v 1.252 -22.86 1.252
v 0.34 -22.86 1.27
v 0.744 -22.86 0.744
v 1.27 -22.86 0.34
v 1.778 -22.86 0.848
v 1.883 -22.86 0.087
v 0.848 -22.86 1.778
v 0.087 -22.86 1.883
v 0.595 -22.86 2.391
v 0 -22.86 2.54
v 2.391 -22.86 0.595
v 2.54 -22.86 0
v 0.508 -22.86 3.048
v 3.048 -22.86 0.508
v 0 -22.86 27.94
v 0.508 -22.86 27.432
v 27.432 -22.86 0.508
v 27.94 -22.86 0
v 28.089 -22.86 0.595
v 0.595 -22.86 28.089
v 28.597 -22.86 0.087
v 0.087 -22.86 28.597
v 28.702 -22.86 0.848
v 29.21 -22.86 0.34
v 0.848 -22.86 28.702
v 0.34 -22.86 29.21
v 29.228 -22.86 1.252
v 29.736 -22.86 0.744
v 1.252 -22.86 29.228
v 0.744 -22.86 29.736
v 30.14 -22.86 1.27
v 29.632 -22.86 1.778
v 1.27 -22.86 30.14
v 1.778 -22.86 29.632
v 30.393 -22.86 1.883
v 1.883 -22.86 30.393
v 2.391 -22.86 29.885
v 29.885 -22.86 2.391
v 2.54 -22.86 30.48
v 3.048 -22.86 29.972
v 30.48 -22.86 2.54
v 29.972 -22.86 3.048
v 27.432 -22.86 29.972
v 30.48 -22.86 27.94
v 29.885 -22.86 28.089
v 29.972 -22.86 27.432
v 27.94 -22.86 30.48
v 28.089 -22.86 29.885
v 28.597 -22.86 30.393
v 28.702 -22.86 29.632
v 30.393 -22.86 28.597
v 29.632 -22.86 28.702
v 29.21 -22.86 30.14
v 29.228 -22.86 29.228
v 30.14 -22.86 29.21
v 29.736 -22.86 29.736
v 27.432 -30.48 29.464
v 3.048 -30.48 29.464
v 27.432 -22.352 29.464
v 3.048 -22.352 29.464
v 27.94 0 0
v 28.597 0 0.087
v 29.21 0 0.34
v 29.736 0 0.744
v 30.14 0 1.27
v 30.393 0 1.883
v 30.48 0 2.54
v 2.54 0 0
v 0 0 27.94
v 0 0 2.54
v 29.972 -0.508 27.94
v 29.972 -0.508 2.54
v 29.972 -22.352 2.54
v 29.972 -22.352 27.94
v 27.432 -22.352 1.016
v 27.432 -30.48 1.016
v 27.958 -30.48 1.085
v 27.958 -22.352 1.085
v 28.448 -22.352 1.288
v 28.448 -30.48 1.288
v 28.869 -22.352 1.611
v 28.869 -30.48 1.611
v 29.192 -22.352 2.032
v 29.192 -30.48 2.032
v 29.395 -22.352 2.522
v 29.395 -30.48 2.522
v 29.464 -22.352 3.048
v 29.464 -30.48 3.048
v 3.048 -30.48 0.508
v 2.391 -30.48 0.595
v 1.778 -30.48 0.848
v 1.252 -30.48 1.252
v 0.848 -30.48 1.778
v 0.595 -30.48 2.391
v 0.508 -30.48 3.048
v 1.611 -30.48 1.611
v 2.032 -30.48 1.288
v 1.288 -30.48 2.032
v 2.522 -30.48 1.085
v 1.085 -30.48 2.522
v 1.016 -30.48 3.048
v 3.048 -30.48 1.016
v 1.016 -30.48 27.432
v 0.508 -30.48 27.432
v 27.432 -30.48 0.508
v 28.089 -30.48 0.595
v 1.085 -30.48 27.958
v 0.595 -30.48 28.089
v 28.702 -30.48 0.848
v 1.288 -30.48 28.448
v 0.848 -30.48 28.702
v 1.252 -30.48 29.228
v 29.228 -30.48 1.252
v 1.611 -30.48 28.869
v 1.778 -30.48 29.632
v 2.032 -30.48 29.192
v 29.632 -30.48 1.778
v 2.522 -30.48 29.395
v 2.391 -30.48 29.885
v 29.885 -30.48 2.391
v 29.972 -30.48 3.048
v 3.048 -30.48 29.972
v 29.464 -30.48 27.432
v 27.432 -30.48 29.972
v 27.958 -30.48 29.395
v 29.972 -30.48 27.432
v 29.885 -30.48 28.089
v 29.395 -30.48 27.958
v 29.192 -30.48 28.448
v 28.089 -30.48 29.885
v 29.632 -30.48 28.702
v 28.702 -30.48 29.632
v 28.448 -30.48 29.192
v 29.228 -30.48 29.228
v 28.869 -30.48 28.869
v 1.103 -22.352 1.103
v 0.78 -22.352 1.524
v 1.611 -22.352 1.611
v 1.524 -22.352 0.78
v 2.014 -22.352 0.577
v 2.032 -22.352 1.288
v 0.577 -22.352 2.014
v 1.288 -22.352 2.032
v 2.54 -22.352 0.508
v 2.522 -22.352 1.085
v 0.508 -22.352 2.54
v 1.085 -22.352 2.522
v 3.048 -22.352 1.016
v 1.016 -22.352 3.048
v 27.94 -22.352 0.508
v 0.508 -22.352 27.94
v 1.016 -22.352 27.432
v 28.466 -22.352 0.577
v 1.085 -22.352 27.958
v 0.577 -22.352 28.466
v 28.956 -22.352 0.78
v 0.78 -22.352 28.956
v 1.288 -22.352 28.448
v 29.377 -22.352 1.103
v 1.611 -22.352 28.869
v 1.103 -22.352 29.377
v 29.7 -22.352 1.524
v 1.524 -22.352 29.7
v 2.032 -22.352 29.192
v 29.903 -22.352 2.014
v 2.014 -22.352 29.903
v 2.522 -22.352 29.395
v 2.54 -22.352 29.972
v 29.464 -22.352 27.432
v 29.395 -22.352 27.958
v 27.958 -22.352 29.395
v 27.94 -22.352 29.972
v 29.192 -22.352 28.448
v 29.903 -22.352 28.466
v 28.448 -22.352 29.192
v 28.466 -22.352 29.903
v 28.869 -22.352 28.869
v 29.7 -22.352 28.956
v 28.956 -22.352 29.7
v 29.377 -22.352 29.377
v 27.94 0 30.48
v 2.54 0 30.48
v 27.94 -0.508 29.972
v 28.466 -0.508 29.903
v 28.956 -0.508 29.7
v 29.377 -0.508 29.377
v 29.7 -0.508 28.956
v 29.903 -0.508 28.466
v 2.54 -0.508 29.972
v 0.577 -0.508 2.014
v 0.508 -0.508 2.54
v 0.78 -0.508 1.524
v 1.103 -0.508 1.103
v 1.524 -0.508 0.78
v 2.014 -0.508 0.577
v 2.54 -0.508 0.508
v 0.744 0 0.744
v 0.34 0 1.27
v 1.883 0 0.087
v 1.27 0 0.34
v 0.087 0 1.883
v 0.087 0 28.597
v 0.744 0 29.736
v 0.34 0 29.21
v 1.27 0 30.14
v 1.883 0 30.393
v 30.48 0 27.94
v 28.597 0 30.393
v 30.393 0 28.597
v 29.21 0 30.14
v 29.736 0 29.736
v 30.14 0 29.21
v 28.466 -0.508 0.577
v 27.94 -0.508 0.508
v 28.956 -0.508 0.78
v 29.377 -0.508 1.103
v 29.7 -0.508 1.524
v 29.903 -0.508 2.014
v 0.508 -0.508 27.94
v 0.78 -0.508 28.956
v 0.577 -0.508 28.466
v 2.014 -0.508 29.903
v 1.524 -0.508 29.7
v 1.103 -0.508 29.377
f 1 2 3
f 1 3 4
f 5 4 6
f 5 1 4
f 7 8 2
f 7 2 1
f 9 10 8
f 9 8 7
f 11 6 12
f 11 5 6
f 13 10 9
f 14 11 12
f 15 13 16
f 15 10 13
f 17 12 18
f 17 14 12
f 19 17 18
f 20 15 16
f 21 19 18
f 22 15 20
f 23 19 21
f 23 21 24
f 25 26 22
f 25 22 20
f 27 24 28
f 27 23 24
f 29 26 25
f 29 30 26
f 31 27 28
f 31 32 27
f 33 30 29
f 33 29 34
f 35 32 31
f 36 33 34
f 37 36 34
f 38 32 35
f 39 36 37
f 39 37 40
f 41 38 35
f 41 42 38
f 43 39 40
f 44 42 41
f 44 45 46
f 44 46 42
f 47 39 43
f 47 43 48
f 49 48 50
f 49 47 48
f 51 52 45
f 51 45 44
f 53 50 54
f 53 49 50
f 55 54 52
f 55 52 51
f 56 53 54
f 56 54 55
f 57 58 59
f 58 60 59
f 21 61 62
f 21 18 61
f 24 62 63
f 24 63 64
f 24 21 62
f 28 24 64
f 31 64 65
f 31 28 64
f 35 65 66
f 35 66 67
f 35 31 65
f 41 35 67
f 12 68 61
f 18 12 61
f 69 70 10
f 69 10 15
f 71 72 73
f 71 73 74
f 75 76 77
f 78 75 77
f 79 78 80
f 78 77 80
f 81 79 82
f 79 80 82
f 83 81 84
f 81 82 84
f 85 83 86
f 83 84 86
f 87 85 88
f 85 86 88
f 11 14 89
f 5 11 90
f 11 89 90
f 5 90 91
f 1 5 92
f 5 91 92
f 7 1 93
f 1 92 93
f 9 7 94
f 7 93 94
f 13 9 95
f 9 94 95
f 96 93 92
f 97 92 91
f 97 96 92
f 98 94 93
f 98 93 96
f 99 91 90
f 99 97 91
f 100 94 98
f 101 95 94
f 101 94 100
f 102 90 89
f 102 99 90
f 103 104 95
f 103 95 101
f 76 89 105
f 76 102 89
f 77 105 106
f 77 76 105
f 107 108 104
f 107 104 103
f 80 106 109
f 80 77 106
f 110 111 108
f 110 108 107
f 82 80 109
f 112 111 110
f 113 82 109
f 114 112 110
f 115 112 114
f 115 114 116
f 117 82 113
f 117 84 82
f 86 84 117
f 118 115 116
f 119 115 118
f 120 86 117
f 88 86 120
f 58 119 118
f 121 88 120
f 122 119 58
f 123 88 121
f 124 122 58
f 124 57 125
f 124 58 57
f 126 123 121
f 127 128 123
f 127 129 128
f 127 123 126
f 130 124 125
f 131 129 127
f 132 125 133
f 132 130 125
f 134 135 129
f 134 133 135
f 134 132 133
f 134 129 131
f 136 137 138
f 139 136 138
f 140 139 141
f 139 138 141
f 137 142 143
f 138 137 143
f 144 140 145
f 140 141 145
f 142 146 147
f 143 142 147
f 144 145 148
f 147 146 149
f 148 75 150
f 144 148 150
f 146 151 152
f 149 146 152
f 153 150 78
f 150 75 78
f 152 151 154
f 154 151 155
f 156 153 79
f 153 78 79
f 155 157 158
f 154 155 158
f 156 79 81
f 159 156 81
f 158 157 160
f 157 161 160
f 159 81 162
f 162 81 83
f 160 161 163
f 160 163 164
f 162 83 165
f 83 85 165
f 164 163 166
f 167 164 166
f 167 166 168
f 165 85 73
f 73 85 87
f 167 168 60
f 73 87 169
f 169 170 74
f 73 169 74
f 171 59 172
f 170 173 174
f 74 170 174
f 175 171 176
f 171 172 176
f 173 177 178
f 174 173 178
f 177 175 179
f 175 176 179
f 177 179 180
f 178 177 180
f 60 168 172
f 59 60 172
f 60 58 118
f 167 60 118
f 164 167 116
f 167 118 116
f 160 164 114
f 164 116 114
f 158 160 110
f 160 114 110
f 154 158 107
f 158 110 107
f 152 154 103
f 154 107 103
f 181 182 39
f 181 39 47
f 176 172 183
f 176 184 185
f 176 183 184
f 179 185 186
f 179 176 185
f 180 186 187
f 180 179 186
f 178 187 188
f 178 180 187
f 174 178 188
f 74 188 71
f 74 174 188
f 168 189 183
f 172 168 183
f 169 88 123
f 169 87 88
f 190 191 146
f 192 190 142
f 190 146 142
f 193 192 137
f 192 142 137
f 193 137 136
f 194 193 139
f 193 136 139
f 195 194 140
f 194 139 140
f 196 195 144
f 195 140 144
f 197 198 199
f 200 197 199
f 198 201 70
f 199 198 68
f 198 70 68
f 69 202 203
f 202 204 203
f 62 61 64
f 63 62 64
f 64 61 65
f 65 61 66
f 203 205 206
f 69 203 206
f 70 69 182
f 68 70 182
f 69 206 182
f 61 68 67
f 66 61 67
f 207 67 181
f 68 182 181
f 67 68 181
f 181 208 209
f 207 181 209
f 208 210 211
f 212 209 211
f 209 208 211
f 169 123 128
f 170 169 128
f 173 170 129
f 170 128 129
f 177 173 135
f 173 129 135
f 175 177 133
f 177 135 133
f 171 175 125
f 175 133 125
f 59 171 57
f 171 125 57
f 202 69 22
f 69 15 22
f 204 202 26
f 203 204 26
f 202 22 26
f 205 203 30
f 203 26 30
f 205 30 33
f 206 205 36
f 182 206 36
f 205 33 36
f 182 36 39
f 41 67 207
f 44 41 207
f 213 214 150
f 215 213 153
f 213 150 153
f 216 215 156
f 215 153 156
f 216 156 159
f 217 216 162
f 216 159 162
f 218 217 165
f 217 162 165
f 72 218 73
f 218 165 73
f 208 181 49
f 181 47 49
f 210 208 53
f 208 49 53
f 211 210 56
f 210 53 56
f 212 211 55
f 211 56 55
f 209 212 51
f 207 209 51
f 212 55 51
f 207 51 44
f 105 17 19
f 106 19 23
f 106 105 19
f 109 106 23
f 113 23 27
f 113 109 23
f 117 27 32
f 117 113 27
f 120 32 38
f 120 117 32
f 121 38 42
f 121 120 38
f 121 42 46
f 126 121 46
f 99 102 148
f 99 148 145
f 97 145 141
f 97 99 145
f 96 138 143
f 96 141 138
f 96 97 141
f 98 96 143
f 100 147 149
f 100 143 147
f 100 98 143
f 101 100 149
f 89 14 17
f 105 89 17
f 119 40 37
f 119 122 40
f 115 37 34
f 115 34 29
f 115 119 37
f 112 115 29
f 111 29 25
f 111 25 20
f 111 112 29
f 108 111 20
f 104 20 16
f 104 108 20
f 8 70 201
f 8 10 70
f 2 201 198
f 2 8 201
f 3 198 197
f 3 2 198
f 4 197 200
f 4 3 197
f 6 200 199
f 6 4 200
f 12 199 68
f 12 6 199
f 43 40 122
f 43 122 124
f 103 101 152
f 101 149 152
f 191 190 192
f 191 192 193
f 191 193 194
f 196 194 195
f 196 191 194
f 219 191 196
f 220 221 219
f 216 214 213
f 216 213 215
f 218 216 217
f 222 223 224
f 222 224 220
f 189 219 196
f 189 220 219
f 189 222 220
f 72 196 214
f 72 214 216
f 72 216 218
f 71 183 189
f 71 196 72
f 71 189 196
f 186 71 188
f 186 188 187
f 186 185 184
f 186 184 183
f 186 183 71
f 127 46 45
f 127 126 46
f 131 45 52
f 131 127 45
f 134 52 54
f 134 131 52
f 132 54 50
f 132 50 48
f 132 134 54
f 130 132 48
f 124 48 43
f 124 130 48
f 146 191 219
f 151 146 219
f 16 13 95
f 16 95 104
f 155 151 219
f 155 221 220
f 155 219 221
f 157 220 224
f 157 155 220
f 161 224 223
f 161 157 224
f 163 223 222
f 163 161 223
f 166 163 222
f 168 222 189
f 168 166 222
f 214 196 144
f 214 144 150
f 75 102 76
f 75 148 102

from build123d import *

# Parameters (mm, degrees)
F0_W     = 30.48
F0_H     = 30.48
F1_DEPTH = 22.86
F2_W     = 29.464
F2_H     = 29.464
F3_DEPTH = 7.62
F4_R     = 2.54
F5_T     = -0.508


with BuildPart() as f1:
    # F0 (on Front) → F1 (new body)
    with BuildSketch(Plane.XZ):
        with Locations((15.24, 15.24)):
            Rectangle(F0_W, F0_H)
    extrude(amount=F1_DEPTH)

    # F2 (on face) → F3 (join)
    with BuildSketch(Plane.XZ.offset(22.86)):
        with Locations((15.24, 15.24)):
            Rectangle(F2_W, F2_H)
    extrude(amount=F3_DEPTH)

    # F4
    f4_edges = [f1.edges().sort_by_distance(p)[0] for p in [
        (30.48, -11.43, 30.48),
        (29.972, -26.67, 29.972),
        (0.508, -26.67, 29.972),
        (0, -11.43, 30.48),
        (0, -11.43, 0),
        (0.508, -26.67, 0.508),
        (30.48, -11.43, 0),
        (29.972, -26.67, 0.508),
    ]]
    fillet(f4_edges, radius=F4_R)

    # F5
    f5_openings = [f1.faces().sort_by_distance(p)[0] for p in [
        (15.24, -30.48, 15.24),
    ]]
    offset(amount=F5_T, openings=f5_openings, kind=Kind.INTERSECTION)


solid = f1.part
